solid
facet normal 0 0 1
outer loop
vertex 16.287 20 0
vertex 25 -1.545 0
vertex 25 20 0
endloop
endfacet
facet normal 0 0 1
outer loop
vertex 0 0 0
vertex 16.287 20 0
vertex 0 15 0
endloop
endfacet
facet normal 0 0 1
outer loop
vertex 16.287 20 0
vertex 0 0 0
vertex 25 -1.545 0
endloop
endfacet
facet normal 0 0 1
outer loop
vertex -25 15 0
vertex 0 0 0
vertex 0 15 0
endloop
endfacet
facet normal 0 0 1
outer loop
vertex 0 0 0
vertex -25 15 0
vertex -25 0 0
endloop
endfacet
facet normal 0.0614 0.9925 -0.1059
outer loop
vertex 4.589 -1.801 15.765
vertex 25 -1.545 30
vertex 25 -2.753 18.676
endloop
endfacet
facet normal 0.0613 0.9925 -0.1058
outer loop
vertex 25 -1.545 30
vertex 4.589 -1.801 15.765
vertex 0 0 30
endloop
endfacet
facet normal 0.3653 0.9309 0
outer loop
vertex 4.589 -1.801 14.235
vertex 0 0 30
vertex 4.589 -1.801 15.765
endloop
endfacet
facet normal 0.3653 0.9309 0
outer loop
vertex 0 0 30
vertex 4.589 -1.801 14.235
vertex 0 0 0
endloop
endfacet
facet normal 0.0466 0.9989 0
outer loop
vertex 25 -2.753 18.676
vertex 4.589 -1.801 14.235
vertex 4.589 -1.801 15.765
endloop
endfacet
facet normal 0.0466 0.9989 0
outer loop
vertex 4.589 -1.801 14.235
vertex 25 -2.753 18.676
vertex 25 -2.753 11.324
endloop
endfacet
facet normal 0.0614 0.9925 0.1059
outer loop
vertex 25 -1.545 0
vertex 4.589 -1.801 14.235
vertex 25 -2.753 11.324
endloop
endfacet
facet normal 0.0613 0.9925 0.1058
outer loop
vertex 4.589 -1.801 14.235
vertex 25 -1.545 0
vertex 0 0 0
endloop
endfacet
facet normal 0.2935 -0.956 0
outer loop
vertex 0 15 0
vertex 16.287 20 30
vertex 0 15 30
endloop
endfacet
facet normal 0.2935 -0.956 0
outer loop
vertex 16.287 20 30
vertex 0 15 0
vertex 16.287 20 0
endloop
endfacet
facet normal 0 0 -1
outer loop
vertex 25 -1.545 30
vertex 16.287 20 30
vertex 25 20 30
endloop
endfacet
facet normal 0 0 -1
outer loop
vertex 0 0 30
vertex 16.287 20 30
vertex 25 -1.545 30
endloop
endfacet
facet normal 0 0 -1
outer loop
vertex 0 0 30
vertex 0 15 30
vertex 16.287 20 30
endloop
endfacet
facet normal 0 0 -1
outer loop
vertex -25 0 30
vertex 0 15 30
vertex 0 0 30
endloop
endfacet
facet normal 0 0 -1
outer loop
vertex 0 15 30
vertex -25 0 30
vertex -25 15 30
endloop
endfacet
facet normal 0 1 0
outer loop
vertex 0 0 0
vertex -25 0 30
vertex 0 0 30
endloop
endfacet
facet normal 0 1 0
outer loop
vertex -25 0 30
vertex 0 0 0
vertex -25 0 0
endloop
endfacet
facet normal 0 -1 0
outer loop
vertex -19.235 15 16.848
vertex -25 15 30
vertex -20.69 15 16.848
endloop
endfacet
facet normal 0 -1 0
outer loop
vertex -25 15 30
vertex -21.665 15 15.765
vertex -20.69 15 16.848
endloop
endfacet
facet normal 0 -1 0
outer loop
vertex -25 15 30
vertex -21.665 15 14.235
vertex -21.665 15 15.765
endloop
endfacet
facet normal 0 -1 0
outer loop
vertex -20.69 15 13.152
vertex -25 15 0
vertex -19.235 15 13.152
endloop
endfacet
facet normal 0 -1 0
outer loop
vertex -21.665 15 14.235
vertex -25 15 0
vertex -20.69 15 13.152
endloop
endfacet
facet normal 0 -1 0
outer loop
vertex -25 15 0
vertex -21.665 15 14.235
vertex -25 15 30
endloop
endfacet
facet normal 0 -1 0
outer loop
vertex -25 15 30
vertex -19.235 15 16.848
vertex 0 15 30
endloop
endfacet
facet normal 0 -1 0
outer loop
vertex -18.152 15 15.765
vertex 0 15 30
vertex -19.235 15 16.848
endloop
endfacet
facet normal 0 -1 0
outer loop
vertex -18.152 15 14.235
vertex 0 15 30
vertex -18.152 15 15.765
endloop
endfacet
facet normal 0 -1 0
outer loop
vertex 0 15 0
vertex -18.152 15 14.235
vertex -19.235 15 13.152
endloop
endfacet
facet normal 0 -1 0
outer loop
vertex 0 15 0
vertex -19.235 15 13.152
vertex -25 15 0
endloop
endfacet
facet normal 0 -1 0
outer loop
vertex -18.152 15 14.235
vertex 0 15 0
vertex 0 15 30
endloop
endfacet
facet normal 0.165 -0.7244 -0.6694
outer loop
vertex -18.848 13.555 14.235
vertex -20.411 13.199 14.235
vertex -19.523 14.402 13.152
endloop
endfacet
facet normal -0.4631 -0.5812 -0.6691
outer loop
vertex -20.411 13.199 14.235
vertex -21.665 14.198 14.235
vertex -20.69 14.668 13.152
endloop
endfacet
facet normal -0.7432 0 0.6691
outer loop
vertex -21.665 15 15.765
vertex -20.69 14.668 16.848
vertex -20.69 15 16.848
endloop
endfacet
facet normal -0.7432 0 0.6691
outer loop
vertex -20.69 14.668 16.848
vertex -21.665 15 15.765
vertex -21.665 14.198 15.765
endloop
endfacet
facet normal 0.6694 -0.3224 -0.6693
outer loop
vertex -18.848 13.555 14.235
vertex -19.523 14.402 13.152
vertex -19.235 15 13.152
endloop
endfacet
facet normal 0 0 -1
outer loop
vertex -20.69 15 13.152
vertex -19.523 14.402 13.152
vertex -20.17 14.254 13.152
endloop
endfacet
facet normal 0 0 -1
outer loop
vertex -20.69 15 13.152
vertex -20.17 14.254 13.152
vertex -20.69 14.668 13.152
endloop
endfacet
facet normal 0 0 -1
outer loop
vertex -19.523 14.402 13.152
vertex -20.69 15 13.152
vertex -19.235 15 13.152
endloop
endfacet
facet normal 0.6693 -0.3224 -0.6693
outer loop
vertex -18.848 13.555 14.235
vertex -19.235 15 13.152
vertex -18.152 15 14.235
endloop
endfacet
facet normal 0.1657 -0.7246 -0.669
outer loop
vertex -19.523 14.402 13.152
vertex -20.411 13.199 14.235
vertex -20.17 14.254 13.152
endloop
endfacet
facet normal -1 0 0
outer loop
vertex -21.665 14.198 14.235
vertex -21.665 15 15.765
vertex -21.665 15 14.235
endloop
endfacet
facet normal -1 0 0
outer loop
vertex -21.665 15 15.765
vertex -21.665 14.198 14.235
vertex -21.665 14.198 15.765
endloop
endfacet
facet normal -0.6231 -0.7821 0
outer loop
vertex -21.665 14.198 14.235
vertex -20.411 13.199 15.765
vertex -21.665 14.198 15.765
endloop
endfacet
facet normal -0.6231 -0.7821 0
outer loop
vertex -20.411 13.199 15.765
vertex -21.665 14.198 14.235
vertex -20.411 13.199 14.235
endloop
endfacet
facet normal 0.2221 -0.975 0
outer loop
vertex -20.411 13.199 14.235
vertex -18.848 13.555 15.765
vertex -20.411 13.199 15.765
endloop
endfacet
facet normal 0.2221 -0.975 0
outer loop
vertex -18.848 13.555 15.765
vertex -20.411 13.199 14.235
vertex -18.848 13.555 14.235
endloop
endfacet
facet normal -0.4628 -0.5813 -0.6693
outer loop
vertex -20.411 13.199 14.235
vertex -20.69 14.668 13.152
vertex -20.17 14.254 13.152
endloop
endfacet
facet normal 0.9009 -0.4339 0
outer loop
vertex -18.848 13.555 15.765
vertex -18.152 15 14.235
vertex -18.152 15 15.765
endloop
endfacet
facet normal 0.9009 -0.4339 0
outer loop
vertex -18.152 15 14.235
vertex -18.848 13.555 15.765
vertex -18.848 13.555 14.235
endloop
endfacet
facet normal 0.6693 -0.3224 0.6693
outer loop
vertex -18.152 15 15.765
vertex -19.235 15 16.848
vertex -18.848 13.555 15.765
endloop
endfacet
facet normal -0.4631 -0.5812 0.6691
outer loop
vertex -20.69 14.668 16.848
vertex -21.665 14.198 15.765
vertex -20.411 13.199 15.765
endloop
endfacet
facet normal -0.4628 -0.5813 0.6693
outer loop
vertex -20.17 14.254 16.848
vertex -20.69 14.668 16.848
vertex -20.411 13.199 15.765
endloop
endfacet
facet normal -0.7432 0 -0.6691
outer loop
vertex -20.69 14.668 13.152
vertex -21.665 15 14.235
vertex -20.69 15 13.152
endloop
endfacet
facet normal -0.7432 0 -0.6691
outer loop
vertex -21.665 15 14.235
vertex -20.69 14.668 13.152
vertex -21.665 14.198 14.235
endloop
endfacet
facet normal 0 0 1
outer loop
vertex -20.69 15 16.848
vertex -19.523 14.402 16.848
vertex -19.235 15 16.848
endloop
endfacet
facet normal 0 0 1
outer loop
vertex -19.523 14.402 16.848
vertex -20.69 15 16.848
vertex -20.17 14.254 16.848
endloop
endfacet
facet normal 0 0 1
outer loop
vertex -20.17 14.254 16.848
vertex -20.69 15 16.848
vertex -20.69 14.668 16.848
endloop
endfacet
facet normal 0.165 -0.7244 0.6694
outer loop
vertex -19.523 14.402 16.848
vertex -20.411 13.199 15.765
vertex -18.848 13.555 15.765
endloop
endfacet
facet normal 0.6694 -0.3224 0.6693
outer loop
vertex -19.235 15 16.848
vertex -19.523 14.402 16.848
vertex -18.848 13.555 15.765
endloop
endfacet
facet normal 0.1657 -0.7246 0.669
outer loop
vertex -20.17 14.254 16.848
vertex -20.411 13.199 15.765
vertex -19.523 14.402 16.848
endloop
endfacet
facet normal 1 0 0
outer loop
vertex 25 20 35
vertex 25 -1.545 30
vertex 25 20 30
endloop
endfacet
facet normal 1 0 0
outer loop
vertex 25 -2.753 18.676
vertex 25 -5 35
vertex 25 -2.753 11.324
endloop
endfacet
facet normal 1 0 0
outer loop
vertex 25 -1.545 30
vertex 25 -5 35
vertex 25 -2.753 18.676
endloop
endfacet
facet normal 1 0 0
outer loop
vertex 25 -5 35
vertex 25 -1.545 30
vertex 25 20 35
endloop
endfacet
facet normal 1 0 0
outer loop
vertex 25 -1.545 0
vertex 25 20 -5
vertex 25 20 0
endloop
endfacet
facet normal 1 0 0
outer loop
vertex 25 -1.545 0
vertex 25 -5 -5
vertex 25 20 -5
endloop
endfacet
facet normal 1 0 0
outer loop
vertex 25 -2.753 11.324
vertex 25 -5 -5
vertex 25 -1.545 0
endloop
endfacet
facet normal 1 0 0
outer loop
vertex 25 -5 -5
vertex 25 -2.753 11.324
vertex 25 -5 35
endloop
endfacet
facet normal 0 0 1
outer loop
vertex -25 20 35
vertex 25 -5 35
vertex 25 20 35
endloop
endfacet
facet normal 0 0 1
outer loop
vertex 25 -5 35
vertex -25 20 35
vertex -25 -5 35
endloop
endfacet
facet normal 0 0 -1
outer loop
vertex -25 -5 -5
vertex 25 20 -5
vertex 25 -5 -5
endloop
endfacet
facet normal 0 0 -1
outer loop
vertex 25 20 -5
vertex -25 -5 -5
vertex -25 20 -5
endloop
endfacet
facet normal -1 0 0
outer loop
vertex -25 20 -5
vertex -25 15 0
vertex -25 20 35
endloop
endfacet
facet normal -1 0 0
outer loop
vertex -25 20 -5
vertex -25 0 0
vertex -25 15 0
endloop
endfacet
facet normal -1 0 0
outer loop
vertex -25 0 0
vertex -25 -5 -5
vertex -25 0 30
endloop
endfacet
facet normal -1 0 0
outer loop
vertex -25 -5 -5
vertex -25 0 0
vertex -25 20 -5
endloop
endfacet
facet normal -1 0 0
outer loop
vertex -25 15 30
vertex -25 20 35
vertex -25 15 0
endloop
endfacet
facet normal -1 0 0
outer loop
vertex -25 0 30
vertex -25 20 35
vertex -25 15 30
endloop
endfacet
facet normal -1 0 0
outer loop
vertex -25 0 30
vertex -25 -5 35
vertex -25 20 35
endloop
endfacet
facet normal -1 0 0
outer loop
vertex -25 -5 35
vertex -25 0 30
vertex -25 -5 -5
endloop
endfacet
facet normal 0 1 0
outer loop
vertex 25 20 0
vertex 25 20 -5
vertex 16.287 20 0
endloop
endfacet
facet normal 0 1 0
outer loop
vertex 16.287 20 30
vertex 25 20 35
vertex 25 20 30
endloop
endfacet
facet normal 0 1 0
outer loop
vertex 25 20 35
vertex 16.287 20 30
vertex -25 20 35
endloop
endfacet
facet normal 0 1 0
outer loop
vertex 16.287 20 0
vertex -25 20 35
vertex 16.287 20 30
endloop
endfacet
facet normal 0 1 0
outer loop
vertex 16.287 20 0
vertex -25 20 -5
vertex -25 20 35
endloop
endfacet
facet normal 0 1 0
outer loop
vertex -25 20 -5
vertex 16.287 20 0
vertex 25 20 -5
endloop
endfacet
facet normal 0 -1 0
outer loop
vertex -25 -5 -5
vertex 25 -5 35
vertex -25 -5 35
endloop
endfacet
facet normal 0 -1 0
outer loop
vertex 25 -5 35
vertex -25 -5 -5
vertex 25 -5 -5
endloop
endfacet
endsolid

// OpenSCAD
difference(){
	translate([-25,-5,-5])
		cube([50,25,40]);

	guide();
	
	rotate(180,[1,0,0])
	translate([-180,-15,-30])
		mount();
	translate([-12,0,0])
	#cube([30,15,30]);
}
module mount(){

	difference(){
		cube([180,15,30]);
		translate([20,50,15])
		rotate(90,[1,0,0])
			cylinder(r=5.5,h=80);
		translate([140,50,15])
		rotate(90,[1,0,0])
			cylinder(r=5.5,h=80);
		translate([175,50,15])
			rotate(90,[1,0,0])
			cylinder(r=12,h=80, $fn=3);
		translate([160,0,15])
			sphere(r=2);
	}
	
}

module guide(){
	scaleit =10;
	difference(){
		union(){
			hull(){
				cube([50,15,30]);
				translate([5,0,15])
					sphere(r=2);
				rotate([0,0,90])
					translate([18,-120,0]) scale (v=[1,3,1]) 
						cylinder(h = 3*scaleit, r=2.5*scaleit);
			}
	
			translate([-5,15,15])
			rotate(90,[1,0,0])
				cylinder(r=12,h=15, $fn=3);
		}
	
		rotate([0,0,90])
		translate(v=[20,-120,-5]) scale (v=[1,3,1])
			cylinder(h = 4*scaleit, r=1.8*scaleit);
		rotate([0,0,90])
			translate(v=[20,-120,-5]) 
				cube([3*scaleit,.7*scaleit,4*scaleit]);
	}
}
